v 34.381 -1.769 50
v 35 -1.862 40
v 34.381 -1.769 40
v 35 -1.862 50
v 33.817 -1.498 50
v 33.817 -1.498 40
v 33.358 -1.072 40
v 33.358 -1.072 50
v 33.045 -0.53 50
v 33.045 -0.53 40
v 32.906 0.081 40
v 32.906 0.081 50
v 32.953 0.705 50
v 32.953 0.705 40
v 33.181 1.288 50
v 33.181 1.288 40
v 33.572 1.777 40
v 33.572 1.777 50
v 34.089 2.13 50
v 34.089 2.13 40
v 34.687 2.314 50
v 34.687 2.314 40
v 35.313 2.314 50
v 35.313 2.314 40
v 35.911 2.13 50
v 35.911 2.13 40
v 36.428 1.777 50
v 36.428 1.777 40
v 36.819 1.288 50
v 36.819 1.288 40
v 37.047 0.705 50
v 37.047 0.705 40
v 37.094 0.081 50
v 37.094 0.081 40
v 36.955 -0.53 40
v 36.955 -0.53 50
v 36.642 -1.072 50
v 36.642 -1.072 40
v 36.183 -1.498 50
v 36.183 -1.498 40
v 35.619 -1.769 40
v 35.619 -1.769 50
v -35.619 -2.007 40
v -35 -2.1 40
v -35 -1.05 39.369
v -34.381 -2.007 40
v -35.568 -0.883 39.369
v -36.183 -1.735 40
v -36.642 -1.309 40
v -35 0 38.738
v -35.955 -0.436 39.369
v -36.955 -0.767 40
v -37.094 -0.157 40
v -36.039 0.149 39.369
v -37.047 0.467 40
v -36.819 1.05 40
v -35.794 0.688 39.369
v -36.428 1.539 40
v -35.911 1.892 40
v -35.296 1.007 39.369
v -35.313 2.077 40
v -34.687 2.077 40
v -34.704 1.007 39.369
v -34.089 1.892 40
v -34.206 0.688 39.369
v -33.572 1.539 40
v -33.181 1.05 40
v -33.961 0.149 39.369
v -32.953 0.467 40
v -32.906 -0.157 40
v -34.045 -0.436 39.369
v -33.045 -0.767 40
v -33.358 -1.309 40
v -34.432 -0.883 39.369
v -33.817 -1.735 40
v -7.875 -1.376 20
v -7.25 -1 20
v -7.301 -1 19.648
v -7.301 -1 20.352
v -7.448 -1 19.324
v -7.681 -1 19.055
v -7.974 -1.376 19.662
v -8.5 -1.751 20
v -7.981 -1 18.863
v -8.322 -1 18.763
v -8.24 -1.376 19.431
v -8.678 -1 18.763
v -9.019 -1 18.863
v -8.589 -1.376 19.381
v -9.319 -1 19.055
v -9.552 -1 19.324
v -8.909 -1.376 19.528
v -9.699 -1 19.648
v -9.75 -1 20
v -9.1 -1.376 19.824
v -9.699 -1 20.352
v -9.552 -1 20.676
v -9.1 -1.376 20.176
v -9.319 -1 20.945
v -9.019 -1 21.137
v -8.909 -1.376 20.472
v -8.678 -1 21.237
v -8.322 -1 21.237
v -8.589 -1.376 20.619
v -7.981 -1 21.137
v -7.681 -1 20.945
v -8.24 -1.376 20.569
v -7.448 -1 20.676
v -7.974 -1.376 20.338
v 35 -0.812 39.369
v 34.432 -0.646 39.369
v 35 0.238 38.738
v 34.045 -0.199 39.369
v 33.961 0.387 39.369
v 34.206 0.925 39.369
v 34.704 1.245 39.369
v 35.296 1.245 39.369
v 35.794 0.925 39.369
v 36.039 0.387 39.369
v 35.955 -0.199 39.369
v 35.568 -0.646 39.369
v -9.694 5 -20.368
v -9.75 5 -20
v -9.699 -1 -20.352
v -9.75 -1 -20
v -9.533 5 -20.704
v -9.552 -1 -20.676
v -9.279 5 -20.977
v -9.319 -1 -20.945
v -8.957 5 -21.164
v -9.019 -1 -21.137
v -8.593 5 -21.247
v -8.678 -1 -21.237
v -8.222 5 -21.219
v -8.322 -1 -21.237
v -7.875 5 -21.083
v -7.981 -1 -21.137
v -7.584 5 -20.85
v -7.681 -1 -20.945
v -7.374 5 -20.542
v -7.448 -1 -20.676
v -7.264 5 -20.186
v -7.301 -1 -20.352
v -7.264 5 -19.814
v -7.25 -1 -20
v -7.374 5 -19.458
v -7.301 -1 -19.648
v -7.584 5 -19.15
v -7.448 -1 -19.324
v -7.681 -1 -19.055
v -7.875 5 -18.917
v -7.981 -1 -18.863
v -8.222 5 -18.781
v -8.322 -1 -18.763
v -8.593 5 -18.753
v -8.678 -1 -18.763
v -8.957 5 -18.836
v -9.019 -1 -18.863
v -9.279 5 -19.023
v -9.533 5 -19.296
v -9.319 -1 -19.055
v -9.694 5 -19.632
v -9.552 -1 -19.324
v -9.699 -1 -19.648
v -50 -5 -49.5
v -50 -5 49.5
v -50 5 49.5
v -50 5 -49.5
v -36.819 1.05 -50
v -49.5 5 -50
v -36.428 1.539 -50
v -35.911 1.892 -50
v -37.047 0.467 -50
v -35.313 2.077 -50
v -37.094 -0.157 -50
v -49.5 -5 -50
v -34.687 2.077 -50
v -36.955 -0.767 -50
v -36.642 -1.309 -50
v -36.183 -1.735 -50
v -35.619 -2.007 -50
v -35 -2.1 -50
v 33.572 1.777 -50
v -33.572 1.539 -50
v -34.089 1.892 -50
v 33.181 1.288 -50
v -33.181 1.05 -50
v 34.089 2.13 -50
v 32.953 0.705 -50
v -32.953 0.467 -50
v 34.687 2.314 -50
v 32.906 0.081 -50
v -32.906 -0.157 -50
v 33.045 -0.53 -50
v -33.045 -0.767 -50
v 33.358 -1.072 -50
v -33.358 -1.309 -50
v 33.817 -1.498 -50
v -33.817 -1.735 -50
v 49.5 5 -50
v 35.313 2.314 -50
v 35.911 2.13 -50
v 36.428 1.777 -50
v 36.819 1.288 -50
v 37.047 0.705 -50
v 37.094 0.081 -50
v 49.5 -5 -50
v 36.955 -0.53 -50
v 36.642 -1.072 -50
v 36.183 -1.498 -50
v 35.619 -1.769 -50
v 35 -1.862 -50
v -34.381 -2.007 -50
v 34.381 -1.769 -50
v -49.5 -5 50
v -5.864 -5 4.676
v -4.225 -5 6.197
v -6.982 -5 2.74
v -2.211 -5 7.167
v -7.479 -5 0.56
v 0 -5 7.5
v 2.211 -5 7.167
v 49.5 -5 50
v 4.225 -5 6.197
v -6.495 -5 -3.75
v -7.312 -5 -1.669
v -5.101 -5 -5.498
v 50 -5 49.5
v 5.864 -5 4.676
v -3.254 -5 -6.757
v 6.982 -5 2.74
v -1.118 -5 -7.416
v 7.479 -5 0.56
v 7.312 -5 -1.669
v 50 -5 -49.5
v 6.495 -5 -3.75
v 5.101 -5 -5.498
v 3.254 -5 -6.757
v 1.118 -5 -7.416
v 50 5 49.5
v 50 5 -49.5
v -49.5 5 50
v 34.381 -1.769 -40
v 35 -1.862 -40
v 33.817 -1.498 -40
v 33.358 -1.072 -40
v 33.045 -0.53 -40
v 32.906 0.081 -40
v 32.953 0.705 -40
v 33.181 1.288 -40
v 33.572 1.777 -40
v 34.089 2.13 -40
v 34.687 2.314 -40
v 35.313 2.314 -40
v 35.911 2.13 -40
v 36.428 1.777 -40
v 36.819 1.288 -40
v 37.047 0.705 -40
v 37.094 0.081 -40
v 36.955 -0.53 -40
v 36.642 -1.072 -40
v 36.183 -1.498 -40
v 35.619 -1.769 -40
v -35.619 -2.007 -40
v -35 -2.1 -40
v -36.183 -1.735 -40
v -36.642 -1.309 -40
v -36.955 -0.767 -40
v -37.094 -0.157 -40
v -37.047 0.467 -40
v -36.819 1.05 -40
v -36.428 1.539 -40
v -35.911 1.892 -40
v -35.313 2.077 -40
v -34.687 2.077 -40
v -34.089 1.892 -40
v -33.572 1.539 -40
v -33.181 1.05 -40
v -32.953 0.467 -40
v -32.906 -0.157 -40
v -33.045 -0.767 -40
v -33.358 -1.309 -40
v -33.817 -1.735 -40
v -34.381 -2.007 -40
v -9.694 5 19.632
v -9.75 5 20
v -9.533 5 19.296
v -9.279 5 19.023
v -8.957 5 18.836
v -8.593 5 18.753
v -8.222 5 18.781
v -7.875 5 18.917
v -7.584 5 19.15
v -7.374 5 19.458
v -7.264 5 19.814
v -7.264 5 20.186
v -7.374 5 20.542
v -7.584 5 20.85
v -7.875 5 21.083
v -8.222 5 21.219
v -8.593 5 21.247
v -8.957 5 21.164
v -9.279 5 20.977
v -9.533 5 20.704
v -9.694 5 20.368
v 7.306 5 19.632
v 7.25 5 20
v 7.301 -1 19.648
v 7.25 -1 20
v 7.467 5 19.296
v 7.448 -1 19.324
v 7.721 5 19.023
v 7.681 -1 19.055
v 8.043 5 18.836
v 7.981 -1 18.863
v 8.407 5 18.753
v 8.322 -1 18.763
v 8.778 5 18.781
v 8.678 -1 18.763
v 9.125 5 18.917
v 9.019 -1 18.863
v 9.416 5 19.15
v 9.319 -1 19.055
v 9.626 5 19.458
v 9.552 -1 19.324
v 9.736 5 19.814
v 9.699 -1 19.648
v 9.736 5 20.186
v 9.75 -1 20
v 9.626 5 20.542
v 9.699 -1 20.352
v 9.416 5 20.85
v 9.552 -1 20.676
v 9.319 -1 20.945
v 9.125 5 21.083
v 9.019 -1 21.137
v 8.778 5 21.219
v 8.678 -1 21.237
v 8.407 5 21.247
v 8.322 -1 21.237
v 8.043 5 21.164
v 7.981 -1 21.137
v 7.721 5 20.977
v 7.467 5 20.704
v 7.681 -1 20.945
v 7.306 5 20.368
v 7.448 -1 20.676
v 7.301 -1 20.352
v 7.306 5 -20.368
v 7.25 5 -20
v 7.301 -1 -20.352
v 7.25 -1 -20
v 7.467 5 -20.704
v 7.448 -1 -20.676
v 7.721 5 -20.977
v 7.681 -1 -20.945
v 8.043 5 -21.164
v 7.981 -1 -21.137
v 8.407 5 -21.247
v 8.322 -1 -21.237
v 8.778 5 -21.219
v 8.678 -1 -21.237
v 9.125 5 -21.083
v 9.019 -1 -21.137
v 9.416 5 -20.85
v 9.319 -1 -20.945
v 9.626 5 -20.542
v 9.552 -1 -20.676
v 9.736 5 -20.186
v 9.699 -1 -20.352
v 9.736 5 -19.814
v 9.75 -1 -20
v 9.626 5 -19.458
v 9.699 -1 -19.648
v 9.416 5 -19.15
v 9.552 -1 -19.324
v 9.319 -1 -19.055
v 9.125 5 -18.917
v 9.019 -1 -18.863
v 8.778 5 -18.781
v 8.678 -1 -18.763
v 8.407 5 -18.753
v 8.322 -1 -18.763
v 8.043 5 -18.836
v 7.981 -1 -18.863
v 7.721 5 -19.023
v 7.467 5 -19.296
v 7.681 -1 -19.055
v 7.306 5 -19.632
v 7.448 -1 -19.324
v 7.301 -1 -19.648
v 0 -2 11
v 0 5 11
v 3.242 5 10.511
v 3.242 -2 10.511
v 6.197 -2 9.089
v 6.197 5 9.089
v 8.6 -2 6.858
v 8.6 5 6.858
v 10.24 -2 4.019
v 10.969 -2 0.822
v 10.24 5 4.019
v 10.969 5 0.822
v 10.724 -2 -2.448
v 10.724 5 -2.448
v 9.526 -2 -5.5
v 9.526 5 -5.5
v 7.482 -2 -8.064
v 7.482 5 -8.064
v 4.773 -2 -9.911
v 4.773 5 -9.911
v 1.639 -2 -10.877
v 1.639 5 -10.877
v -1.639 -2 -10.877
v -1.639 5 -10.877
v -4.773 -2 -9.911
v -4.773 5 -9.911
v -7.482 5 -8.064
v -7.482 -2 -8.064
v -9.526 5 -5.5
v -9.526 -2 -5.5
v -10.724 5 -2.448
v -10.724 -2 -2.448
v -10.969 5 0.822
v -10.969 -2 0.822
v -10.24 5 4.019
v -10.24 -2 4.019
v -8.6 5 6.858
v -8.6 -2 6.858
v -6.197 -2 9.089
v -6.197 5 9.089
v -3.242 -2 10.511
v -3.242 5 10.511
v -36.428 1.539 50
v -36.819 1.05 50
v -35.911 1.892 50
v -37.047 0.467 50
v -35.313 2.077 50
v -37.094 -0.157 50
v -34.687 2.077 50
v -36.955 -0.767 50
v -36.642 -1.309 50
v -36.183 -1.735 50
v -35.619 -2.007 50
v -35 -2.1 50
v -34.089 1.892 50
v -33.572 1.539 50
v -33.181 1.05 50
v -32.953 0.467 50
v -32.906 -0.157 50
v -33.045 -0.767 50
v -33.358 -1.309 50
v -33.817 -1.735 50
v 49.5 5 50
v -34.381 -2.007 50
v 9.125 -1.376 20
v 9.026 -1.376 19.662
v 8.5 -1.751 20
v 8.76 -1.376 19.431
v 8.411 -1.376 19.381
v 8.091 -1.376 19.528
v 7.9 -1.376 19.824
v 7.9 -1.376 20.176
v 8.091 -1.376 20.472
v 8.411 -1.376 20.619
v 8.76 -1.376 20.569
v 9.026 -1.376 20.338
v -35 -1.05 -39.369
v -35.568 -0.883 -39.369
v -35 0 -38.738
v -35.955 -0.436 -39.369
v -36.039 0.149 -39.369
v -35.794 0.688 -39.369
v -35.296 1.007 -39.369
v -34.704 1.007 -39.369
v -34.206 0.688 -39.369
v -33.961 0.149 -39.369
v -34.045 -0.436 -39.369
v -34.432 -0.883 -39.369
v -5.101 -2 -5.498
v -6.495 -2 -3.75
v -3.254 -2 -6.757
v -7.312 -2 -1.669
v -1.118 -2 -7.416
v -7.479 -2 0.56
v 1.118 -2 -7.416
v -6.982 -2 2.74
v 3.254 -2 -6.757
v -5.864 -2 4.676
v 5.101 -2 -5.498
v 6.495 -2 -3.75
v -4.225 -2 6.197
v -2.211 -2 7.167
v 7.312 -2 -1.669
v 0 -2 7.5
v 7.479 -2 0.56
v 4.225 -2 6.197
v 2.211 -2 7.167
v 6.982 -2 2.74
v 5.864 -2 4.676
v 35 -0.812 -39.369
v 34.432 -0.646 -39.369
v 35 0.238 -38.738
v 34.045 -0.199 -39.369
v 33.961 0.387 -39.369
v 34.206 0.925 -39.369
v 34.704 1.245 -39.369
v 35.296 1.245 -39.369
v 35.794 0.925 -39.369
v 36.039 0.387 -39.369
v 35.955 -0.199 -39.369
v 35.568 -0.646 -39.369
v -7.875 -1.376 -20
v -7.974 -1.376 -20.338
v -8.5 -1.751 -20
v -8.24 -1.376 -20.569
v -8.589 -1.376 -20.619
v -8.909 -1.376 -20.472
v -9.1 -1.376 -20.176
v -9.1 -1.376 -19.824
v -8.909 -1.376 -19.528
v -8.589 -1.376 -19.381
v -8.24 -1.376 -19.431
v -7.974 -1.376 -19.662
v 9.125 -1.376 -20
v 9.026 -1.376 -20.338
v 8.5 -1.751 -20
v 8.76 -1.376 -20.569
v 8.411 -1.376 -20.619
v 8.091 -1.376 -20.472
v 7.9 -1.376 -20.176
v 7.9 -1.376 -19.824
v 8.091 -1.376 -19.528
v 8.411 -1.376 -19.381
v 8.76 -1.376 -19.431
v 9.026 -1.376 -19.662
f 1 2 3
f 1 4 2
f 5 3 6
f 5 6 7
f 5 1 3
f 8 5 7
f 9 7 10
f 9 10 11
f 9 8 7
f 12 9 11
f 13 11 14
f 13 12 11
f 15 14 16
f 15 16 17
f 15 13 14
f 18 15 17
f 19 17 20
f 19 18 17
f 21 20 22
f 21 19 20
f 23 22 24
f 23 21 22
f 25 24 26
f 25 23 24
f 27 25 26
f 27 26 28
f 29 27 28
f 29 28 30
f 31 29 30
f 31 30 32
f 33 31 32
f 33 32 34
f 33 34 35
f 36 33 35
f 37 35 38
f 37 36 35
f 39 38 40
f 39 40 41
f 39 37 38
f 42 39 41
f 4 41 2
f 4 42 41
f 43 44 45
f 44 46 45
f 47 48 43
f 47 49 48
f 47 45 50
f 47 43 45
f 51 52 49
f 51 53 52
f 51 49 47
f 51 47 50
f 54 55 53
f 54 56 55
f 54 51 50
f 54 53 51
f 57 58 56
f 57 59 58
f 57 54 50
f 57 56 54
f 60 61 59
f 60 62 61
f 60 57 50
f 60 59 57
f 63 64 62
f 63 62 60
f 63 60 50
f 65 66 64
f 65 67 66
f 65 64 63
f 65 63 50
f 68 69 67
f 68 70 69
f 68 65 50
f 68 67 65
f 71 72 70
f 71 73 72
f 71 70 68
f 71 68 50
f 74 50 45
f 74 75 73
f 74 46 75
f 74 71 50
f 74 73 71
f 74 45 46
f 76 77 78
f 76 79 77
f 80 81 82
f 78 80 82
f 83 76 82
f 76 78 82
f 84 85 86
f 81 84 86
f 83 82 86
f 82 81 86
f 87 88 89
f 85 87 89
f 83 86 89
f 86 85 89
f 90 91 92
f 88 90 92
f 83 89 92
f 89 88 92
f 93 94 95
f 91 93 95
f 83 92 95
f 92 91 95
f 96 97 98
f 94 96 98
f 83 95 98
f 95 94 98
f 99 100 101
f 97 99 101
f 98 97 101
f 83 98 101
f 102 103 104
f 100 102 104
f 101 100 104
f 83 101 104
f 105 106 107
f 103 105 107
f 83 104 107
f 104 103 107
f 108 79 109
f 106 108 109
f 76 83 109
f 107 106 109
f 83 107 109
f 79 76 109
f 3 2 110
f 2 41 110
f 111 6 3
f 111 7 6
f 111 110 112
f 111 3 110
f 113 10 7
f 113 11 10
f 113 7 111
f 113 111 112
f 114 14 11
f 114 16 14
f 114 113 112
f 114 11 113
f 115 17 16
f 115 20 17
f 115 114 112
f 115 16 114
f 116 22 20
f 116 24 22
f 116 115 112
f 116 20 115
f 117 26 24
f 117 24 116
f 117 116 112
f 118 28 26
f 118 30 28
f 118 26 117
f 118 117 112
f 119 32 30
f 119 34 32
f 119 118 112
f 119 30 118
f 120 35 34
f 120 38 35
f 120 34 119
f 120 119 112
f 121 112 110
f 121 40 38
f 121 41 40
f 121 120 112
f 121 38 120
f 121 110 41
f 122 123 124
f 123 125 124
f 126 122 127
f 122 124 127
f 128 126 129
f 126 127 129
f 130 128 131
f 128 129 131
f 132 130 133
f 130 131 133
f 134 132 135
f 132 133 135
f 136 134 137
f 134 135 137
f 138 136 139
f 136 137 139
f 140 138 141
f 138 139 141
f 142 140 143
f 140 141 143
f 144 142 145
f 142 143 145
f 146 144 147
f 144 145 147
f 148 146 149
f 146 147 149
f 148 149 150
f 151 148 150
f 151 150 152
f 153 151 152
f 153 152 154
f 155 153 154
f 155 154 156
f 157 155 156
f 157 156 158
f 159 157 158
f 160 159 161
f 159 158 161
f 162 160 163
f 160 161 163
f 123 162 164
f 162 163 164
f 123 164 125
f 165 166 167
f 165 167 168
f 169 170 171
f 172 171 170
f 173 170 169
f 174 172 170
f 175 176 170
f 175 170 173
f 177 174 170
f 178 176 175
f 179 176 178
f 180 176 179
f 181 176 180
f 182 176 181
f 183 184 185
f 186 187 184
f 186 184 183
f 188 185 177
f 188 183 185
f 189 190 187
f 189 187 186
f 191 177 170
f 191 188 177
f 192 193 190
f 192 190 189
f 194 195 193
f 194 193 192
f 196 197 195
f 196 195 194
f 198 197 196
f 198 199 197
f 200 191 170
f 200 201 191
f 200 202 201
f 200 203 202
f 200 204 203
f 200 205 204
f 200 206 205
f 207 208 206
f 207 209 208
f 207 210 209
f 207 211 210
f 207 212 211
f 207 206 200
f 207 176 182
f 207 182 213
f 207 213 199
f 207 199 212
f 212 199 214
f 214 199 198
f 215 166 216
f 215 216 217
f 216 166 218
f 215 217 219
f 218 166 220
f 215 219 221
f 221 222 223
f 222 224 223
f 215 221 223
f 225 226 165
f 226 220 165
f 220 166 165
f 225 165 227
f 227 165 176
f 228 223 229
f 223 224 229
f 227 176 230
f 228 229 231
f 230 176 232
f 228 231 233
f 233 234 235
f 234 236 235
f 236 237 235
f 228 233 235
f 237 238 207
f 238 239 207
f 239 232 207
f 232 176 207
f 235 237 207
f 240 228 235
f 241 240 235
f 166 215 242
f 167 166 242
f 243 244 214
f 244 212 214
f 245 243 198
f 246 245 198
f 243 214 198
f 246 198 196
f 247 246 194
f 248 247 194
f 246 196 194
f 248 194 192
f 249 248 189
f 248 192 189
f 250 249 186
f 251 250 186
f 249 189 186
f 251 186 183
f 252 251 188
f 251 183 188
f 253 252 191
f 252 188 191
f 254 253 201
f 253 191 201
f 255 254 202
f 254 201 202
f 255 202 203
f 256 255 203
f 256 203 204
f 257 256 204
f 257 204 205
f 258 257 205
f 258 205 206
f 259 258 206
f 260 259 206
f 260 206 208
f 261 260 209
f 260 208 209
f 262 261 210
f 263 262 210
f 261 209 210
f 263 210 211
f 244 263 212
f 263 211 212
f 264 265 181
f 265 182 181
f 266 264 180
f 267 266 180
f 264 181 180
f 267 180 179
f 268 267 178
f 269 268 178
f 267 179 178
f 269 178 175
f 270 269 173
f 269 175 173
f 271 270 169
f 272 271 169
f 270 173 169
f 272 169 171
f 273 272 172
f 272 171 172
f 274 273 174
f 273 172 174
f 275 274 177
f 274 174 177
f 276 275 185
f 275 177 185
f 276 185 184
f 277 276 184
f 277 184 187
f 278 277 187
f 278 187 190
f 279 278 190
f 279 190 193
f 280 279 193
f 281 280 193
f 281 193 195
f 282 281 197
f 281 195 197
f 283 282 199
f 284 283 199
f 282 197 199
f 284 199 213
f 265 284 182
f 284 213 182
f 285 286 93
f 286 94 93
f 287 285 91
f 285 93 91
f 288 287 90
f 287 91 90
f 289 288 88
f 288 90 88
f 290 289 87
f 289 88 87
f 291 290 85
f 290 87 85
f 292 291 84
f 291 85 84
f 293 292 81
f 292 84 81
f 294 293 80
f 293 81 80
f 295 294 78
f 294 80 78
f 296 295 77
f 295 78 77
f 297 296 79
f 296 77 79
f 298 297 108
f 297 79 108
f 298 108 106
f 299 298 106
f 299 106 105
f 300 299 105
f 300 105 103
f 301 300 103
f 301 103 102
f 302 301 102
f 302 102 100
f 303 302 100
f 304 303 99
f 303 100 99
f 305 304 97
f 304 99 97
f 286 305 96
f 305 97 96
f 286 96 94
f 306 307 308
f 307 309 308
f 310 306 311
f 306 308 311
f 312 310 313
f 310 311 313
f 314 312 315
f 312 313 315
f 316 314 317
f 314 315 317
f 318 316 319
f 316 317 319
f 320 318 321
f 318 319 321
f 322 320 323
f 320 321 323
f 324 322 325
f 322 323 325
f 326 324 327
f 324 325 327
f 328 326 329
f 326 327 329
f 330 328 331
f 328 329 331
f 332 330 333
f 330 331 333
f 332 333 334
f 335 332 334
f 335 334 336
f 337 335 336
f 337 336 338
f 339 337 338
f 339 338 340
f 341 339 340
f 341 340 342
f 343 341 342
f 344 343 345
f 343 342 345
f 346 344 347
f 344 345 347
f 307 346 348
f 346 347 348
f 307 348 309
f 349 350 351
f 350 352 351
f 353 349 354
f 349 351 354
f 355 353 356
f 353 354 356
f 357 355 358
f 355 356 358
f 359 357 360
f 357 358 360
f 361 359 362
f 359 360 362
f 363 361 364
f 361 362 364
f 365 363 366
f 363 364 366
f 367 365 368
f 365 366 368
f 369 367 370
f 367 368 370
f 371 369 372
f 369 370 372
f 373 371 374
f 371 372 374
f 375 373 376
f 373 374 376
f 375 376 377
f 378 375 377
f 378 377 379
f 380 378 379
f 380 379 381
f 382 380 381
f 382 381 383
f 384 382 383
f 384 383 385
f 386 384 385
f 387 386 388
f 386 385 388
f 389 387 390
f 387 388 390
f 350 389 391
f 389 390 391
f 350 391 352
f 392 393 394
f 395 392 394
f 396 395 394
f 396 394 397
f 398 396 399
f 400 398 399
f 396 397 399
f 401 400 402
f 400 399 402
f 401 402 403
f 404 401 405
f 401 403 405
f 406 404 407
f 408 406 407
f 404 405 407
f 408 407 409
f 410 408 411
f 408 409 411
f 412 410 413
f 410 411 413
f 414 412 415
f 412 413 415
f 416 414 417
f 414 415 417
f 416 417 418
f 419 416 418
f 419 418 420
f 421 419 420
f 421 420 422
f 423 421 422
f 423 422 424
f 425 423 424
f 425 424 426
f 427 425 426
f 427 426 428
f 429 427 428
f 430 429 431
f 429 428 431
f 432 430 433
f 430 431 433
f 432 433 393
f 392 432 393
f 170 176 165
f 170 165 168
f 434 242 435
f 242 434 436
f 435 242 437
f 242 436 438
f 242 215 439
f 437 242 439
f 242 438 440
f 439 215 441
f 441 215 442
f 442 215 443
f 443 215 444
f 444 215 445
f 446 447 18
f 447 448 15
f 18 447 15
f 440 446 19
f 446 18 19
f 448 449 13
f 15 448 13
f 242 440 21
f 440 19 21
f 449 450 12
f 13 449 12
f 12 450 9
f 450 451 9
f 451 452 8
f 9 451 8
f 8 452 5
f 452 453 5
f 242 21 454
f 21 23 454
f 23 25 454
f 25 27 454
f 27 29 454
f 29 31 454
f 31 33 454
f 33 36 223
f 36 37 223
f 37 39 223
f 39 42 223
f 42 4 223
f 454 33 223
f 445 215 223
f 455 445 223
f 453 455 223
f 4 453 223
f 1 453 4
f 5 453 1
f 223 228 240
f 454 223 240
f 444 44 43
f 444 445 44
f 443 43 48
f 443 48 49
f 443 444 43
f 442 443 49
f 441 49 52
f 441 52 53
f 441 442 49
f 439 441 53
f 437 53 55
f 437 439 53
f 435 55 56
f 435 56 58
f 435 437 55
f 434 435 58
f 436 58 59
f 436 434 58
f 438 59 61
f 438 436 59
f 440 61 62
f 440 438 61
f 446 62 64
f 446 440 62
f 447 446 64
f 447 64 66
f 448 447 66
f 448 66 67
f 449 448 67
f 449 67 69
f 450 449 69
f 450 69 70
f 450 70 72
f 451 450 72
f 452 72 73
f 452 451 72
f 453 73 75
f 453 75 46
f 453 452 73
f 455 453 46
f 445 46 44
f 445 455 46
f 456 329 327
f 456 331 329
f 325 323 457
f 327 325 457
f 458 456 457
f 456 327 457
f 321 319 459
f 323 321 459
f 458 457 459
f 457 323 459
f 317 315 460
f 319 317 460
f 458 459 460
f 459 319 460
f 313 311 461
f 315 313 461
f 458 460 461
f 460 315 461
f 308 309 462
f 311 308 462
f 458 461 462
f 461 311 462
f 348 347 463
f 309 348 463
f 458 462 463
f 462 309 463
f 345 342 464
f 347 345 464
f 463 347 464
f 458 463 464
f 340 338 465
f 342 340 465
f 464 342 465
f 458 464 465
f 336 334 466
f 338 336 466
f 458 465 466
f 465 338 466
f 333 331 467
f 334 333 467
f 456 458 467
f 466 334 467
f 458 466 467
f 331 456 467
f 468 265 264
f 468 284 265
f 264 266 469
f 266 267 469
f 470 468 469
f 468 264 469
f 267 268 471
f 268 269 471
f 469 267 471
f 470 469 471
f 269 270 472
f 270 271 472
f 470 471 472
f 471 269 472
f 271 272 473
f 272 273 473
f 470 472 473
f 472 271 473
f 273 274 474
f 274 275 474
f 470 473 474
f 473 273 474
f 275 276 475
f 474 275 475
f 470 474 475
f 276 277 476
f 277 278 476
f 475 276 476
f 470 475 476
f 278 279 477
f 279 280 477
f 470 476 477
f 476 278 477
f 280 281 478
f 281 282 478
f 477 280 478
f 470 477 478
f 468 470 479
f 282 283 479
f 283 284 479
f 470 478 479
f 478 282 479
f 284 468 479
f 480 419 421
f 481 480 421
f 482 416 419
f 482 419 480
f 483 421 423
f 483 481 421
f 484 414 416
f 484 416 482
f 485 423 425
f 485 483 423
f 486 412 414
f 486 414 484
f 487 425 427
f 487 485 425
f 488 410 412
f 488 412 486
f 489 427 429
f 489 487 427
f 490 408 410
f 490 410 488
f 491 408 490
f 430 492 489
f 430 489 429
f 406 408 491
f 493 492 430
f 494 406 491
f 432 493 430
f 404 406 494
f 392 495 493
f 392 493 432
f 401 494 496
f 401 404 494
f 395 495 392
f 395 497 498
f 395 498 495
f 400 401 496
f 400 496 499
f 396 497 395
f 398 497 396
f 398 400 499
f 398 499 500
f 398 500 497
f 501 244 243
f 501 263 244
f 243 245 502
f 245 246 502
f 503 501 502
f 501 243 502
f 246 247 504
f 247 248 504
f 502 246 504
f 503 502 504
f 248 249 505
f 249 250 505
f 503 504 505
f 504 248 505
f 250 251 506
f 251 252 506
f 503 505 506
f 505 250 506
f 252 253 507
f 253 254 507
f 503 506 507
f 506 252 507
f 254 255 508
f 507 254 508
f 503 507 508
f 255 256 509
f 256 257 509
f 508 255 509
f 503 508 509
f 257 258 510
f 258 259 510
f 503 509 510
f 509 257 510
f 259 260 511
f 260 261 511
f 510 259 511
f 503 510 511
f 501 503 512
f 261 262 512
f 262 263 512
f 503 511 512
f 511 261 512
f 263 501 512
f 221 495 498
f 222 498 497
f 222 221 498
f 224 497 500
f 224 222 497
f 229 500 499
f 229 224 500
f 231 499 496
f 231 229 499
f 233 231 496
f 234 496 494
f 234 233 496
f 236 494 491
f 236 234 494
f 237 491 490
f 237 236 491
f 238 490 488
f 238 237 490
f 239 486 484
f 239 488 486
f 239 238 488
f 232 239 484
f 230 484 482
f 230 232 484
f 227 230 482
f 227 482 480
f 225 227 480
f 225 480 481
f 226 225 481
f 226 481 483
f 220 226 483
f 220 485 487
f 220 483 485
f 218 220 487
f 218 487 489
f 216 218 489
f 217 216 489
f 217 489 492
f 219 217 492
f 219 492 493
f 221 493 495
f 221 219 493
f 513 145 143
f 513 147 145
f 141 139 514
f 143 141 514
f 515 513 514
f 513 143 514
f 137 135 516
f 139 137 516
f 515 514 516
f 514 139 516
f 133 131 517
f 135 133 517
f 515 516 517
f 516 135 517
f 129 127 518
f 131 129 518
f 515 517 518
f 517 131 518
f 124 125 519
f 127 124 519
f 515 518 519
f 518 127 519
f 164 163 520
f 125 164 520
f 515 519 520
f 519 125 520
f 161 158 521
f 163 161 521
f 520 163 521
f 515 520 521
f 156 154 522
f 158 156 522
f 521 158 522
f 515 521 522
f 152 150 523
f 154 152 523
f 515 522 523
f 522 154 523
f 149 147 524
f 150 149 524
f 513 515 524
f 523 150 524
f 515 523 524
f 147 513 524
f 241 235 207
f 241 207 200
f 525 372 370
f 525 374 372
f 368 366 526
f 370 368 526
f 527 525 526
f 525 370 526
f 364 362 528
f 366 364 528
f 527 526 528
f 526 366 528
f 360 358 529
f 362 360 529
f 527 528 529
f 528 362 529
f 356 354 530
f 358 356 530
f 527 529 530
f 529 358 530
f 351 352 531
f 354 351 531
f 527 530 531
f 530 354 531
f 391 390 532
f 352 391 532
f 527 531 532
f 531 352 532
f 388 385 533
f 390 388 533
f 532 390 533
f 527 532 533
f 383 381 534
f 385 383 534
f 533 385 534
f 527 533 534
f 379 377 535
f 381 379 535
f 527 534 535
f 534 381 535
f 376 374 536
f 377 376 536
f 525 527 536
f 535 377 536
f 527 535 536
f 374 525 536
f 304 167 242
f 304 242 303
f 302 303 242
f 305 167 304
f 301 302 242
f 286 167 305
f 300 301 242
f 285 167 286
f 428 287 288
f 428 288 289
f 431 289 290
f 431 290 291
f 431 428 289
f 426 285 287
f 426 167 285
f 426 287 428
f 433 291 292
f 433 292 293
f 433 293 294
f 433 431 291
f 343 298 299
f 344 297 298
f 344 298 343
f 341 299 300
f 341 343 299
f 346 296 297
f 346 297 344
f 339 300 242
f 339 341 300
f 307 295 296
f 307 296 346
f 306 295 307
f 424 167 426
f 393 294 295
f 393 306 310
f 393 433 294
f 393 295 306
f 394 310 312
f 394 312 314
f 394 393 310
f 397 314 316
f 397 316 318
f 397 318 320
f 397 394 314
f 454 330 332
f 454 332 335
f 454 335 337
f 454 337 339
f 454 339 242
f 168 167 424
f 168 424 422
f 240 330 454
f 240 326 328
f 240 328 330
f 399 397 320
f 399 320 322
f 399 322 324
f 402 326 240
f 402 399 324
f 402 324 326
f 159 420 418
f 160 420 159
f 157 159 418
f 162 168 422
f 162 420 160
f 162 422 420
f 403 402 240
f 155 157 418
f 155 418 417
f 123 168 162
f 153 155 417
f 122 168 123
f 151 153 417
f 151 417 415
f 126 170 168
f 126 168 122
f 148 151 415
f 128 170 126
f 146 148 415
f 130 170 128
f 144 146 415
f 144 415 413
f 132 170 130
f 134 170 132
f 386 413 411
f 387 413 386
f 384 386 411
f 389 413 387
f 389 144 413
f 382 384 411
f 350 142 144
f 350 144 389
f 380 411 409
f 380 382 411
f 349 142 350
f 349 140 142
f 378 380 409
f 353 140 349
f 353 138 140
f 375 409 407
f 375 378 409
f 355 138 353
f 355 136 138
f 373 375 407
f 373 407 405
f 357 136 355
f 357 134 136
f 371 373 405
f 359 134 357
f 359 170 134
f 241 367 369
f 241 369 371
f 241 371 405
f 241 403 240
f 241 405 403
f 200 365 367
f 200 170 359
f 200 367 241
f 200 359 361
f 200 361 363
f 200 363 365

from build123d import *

# Parameters (mm, degrees)
BOSS_EXTRUDE1_DEPTH                  = 5
BOSS_EXTRUDE1_DEPTH_BACK             = 5
SKETCH1_W                            = 100
SKETCH1_H                            = 100
SKETCH1_R                            = 7.5
SKETCH2_R                            = 11
CUT_EXTRUDE1_DEPTH                   = 7
TAP_DRILL_FOR_M5X0_8_TAP1_AT_2_COUNT = 2
TAP_DRILL_FOR_M5X0_8_TAP1_AT_2_PITCH = 70.000402901
TAP_DRILL_FOR_M3X0_5_TAP2_D          = 2.5
TAP_DRILL_FOR_M3X0_5_TAP2_DEPTH      = 6
TAP_DRILL_FOR_M3X0_5_TAP2_TIP        = 0.751075774
CHAMFER1_SIZE                        = 0.5


with BuildPart() as part:
    # Sketch1 → Boss-Extrude1 (new, two sides: drawn at the far end of the back side and taken through both)
    with BuildSketch(Plane(origin=(0, 0, 0), x_dir=(1, 0, 0), z_dir=(0, 1, 0)).offset(-BOSS_EXTRUDE1_DEPTH_BACK)):
        Rectangle(SKETCH1_W, SKETCH1_H)
        with Locations(Location((0, 0, 0), (0, 0, 270))):
            Circle(SKETCH1_R, mode=Mode.SUBTRACT)
    extrude(amount=BOSS_EXTRUDE1_DEPTH + BOSS_EXTRUDE1_DEPTH_BACK)

    # Sketch2 → Cut-Extrude1 (cut)
    with BuildSketch(Plane(origin=(0, 5, 0), x_dir=(1, 0, 0), z_dir=(0, 1, 0))):
        with Locations(Location((0, 0, 0), (0, 0, 270))):
            Circle(SKETCH2_R)
    extrude(amount=-CUT_EXTRUDE1_DEPTH, mode=Mode.SUBTRACT)

    # Sketch6 → Tap Drill for M5x0.8 Tap1 (revolve, cut)
    with BuildSketch(Plane(origin=(-35, 0, 50), x_dir=(0, -1, 0), z_dir=(1, 0, 0))):
        Polygon((0, 0), (0, 11.2618073), (2.1, 10), (2.1, 0), align=None)
    tap_drill_for_m5x0_8_tap1 = revolve(axis=Axis((-35, 0, 56.35), (0, 0, -1)), mode=Mode.SUBTRACT)

    # Tap Drill for M5x0.8 Tap1 at 2: Tap Drill for M5x0.8 Tap1 ×2
    with Locations(*[Vector(0.9999942443098965, 0.0033928376146228614, 0) * (i * TAP_DRILL_FOR_M5X0_8_TAP1_AT_2_PITCH) for i in range(1, TAP_DRILL_FOR_M5X0_8_TAP1_AT_2_COUNT)]):
        add(tap_drill_for_m5x0_8_tap1, mode=Mode.SUBTRACT)

    # Mirror1: Tap Drill for M5x0.8 Tap1 across plane
    add(tap_drill_for_m5x0_8_tap1.mirror(Plane(origin=(0, 0, 0), x_dir=(1, 0, 0), z_dir=(0, 0, -1))), mode=Mode.SUBTRACT)

    # Mirror1 copy 1 sketch → Mirror1 copy 1 (revolve, cut)
    with BuildSketch(Plane(origin=(35, 0.2375, -50), x_dir=(0, -1, 0), z_dir=(1, 0, 0))):
        Polygon((0, 0), (0, -11.2618073), (2.1, -10), (2.1, 0), align=None)
    revolve(axis=Axis((35, 0.2375, -56.35), (0, 0, -1)), mode=Mode.SUBTRACT)

    # Tap Drill for M3x0.5 Tap2
    with Locations(Plane(origin=(0, 5, 0), x_dir=(1, 0, 0), z_dir=(0, 1, 0))):
        with Locations((-8.5, -20), (8.5, -20), (8.5, 20), (-8.5, 20)):
            Hole(TAP_DRILL_FOR_M3X0_5_TAP2_D / 2, depth=TAP_DRILL_FOR_M3X0_5_TAP2_DEPTH)
            with Locations((0, 0, -(TAP_DRILL_FOR_M3X0_5_TAP2_DEPTH + TAP_DRILL_FOR_M3X0_5_TAP2_TIP / 2))):  # 118° drill point
                Cone(0, TAP_DRILL_FOR_M3X0_5_TAP2_D / 2, TAP_DRILL_FOR_M3X0_5_TAP2_TIP, mode=Mode.SUBTRACT)

    # Chamfer1
    chamfer1_edges = [part.edges().sort_by_distance(p)[0] for p in [
        (-50, 0, -50),
        (50, 0, -50),
        (50, 0, 50),
        (-50, 0, 50),
    ]]
    chamfer(chamfer1_edges, length=CHAMFER1_SIZE)


solid = part.part
